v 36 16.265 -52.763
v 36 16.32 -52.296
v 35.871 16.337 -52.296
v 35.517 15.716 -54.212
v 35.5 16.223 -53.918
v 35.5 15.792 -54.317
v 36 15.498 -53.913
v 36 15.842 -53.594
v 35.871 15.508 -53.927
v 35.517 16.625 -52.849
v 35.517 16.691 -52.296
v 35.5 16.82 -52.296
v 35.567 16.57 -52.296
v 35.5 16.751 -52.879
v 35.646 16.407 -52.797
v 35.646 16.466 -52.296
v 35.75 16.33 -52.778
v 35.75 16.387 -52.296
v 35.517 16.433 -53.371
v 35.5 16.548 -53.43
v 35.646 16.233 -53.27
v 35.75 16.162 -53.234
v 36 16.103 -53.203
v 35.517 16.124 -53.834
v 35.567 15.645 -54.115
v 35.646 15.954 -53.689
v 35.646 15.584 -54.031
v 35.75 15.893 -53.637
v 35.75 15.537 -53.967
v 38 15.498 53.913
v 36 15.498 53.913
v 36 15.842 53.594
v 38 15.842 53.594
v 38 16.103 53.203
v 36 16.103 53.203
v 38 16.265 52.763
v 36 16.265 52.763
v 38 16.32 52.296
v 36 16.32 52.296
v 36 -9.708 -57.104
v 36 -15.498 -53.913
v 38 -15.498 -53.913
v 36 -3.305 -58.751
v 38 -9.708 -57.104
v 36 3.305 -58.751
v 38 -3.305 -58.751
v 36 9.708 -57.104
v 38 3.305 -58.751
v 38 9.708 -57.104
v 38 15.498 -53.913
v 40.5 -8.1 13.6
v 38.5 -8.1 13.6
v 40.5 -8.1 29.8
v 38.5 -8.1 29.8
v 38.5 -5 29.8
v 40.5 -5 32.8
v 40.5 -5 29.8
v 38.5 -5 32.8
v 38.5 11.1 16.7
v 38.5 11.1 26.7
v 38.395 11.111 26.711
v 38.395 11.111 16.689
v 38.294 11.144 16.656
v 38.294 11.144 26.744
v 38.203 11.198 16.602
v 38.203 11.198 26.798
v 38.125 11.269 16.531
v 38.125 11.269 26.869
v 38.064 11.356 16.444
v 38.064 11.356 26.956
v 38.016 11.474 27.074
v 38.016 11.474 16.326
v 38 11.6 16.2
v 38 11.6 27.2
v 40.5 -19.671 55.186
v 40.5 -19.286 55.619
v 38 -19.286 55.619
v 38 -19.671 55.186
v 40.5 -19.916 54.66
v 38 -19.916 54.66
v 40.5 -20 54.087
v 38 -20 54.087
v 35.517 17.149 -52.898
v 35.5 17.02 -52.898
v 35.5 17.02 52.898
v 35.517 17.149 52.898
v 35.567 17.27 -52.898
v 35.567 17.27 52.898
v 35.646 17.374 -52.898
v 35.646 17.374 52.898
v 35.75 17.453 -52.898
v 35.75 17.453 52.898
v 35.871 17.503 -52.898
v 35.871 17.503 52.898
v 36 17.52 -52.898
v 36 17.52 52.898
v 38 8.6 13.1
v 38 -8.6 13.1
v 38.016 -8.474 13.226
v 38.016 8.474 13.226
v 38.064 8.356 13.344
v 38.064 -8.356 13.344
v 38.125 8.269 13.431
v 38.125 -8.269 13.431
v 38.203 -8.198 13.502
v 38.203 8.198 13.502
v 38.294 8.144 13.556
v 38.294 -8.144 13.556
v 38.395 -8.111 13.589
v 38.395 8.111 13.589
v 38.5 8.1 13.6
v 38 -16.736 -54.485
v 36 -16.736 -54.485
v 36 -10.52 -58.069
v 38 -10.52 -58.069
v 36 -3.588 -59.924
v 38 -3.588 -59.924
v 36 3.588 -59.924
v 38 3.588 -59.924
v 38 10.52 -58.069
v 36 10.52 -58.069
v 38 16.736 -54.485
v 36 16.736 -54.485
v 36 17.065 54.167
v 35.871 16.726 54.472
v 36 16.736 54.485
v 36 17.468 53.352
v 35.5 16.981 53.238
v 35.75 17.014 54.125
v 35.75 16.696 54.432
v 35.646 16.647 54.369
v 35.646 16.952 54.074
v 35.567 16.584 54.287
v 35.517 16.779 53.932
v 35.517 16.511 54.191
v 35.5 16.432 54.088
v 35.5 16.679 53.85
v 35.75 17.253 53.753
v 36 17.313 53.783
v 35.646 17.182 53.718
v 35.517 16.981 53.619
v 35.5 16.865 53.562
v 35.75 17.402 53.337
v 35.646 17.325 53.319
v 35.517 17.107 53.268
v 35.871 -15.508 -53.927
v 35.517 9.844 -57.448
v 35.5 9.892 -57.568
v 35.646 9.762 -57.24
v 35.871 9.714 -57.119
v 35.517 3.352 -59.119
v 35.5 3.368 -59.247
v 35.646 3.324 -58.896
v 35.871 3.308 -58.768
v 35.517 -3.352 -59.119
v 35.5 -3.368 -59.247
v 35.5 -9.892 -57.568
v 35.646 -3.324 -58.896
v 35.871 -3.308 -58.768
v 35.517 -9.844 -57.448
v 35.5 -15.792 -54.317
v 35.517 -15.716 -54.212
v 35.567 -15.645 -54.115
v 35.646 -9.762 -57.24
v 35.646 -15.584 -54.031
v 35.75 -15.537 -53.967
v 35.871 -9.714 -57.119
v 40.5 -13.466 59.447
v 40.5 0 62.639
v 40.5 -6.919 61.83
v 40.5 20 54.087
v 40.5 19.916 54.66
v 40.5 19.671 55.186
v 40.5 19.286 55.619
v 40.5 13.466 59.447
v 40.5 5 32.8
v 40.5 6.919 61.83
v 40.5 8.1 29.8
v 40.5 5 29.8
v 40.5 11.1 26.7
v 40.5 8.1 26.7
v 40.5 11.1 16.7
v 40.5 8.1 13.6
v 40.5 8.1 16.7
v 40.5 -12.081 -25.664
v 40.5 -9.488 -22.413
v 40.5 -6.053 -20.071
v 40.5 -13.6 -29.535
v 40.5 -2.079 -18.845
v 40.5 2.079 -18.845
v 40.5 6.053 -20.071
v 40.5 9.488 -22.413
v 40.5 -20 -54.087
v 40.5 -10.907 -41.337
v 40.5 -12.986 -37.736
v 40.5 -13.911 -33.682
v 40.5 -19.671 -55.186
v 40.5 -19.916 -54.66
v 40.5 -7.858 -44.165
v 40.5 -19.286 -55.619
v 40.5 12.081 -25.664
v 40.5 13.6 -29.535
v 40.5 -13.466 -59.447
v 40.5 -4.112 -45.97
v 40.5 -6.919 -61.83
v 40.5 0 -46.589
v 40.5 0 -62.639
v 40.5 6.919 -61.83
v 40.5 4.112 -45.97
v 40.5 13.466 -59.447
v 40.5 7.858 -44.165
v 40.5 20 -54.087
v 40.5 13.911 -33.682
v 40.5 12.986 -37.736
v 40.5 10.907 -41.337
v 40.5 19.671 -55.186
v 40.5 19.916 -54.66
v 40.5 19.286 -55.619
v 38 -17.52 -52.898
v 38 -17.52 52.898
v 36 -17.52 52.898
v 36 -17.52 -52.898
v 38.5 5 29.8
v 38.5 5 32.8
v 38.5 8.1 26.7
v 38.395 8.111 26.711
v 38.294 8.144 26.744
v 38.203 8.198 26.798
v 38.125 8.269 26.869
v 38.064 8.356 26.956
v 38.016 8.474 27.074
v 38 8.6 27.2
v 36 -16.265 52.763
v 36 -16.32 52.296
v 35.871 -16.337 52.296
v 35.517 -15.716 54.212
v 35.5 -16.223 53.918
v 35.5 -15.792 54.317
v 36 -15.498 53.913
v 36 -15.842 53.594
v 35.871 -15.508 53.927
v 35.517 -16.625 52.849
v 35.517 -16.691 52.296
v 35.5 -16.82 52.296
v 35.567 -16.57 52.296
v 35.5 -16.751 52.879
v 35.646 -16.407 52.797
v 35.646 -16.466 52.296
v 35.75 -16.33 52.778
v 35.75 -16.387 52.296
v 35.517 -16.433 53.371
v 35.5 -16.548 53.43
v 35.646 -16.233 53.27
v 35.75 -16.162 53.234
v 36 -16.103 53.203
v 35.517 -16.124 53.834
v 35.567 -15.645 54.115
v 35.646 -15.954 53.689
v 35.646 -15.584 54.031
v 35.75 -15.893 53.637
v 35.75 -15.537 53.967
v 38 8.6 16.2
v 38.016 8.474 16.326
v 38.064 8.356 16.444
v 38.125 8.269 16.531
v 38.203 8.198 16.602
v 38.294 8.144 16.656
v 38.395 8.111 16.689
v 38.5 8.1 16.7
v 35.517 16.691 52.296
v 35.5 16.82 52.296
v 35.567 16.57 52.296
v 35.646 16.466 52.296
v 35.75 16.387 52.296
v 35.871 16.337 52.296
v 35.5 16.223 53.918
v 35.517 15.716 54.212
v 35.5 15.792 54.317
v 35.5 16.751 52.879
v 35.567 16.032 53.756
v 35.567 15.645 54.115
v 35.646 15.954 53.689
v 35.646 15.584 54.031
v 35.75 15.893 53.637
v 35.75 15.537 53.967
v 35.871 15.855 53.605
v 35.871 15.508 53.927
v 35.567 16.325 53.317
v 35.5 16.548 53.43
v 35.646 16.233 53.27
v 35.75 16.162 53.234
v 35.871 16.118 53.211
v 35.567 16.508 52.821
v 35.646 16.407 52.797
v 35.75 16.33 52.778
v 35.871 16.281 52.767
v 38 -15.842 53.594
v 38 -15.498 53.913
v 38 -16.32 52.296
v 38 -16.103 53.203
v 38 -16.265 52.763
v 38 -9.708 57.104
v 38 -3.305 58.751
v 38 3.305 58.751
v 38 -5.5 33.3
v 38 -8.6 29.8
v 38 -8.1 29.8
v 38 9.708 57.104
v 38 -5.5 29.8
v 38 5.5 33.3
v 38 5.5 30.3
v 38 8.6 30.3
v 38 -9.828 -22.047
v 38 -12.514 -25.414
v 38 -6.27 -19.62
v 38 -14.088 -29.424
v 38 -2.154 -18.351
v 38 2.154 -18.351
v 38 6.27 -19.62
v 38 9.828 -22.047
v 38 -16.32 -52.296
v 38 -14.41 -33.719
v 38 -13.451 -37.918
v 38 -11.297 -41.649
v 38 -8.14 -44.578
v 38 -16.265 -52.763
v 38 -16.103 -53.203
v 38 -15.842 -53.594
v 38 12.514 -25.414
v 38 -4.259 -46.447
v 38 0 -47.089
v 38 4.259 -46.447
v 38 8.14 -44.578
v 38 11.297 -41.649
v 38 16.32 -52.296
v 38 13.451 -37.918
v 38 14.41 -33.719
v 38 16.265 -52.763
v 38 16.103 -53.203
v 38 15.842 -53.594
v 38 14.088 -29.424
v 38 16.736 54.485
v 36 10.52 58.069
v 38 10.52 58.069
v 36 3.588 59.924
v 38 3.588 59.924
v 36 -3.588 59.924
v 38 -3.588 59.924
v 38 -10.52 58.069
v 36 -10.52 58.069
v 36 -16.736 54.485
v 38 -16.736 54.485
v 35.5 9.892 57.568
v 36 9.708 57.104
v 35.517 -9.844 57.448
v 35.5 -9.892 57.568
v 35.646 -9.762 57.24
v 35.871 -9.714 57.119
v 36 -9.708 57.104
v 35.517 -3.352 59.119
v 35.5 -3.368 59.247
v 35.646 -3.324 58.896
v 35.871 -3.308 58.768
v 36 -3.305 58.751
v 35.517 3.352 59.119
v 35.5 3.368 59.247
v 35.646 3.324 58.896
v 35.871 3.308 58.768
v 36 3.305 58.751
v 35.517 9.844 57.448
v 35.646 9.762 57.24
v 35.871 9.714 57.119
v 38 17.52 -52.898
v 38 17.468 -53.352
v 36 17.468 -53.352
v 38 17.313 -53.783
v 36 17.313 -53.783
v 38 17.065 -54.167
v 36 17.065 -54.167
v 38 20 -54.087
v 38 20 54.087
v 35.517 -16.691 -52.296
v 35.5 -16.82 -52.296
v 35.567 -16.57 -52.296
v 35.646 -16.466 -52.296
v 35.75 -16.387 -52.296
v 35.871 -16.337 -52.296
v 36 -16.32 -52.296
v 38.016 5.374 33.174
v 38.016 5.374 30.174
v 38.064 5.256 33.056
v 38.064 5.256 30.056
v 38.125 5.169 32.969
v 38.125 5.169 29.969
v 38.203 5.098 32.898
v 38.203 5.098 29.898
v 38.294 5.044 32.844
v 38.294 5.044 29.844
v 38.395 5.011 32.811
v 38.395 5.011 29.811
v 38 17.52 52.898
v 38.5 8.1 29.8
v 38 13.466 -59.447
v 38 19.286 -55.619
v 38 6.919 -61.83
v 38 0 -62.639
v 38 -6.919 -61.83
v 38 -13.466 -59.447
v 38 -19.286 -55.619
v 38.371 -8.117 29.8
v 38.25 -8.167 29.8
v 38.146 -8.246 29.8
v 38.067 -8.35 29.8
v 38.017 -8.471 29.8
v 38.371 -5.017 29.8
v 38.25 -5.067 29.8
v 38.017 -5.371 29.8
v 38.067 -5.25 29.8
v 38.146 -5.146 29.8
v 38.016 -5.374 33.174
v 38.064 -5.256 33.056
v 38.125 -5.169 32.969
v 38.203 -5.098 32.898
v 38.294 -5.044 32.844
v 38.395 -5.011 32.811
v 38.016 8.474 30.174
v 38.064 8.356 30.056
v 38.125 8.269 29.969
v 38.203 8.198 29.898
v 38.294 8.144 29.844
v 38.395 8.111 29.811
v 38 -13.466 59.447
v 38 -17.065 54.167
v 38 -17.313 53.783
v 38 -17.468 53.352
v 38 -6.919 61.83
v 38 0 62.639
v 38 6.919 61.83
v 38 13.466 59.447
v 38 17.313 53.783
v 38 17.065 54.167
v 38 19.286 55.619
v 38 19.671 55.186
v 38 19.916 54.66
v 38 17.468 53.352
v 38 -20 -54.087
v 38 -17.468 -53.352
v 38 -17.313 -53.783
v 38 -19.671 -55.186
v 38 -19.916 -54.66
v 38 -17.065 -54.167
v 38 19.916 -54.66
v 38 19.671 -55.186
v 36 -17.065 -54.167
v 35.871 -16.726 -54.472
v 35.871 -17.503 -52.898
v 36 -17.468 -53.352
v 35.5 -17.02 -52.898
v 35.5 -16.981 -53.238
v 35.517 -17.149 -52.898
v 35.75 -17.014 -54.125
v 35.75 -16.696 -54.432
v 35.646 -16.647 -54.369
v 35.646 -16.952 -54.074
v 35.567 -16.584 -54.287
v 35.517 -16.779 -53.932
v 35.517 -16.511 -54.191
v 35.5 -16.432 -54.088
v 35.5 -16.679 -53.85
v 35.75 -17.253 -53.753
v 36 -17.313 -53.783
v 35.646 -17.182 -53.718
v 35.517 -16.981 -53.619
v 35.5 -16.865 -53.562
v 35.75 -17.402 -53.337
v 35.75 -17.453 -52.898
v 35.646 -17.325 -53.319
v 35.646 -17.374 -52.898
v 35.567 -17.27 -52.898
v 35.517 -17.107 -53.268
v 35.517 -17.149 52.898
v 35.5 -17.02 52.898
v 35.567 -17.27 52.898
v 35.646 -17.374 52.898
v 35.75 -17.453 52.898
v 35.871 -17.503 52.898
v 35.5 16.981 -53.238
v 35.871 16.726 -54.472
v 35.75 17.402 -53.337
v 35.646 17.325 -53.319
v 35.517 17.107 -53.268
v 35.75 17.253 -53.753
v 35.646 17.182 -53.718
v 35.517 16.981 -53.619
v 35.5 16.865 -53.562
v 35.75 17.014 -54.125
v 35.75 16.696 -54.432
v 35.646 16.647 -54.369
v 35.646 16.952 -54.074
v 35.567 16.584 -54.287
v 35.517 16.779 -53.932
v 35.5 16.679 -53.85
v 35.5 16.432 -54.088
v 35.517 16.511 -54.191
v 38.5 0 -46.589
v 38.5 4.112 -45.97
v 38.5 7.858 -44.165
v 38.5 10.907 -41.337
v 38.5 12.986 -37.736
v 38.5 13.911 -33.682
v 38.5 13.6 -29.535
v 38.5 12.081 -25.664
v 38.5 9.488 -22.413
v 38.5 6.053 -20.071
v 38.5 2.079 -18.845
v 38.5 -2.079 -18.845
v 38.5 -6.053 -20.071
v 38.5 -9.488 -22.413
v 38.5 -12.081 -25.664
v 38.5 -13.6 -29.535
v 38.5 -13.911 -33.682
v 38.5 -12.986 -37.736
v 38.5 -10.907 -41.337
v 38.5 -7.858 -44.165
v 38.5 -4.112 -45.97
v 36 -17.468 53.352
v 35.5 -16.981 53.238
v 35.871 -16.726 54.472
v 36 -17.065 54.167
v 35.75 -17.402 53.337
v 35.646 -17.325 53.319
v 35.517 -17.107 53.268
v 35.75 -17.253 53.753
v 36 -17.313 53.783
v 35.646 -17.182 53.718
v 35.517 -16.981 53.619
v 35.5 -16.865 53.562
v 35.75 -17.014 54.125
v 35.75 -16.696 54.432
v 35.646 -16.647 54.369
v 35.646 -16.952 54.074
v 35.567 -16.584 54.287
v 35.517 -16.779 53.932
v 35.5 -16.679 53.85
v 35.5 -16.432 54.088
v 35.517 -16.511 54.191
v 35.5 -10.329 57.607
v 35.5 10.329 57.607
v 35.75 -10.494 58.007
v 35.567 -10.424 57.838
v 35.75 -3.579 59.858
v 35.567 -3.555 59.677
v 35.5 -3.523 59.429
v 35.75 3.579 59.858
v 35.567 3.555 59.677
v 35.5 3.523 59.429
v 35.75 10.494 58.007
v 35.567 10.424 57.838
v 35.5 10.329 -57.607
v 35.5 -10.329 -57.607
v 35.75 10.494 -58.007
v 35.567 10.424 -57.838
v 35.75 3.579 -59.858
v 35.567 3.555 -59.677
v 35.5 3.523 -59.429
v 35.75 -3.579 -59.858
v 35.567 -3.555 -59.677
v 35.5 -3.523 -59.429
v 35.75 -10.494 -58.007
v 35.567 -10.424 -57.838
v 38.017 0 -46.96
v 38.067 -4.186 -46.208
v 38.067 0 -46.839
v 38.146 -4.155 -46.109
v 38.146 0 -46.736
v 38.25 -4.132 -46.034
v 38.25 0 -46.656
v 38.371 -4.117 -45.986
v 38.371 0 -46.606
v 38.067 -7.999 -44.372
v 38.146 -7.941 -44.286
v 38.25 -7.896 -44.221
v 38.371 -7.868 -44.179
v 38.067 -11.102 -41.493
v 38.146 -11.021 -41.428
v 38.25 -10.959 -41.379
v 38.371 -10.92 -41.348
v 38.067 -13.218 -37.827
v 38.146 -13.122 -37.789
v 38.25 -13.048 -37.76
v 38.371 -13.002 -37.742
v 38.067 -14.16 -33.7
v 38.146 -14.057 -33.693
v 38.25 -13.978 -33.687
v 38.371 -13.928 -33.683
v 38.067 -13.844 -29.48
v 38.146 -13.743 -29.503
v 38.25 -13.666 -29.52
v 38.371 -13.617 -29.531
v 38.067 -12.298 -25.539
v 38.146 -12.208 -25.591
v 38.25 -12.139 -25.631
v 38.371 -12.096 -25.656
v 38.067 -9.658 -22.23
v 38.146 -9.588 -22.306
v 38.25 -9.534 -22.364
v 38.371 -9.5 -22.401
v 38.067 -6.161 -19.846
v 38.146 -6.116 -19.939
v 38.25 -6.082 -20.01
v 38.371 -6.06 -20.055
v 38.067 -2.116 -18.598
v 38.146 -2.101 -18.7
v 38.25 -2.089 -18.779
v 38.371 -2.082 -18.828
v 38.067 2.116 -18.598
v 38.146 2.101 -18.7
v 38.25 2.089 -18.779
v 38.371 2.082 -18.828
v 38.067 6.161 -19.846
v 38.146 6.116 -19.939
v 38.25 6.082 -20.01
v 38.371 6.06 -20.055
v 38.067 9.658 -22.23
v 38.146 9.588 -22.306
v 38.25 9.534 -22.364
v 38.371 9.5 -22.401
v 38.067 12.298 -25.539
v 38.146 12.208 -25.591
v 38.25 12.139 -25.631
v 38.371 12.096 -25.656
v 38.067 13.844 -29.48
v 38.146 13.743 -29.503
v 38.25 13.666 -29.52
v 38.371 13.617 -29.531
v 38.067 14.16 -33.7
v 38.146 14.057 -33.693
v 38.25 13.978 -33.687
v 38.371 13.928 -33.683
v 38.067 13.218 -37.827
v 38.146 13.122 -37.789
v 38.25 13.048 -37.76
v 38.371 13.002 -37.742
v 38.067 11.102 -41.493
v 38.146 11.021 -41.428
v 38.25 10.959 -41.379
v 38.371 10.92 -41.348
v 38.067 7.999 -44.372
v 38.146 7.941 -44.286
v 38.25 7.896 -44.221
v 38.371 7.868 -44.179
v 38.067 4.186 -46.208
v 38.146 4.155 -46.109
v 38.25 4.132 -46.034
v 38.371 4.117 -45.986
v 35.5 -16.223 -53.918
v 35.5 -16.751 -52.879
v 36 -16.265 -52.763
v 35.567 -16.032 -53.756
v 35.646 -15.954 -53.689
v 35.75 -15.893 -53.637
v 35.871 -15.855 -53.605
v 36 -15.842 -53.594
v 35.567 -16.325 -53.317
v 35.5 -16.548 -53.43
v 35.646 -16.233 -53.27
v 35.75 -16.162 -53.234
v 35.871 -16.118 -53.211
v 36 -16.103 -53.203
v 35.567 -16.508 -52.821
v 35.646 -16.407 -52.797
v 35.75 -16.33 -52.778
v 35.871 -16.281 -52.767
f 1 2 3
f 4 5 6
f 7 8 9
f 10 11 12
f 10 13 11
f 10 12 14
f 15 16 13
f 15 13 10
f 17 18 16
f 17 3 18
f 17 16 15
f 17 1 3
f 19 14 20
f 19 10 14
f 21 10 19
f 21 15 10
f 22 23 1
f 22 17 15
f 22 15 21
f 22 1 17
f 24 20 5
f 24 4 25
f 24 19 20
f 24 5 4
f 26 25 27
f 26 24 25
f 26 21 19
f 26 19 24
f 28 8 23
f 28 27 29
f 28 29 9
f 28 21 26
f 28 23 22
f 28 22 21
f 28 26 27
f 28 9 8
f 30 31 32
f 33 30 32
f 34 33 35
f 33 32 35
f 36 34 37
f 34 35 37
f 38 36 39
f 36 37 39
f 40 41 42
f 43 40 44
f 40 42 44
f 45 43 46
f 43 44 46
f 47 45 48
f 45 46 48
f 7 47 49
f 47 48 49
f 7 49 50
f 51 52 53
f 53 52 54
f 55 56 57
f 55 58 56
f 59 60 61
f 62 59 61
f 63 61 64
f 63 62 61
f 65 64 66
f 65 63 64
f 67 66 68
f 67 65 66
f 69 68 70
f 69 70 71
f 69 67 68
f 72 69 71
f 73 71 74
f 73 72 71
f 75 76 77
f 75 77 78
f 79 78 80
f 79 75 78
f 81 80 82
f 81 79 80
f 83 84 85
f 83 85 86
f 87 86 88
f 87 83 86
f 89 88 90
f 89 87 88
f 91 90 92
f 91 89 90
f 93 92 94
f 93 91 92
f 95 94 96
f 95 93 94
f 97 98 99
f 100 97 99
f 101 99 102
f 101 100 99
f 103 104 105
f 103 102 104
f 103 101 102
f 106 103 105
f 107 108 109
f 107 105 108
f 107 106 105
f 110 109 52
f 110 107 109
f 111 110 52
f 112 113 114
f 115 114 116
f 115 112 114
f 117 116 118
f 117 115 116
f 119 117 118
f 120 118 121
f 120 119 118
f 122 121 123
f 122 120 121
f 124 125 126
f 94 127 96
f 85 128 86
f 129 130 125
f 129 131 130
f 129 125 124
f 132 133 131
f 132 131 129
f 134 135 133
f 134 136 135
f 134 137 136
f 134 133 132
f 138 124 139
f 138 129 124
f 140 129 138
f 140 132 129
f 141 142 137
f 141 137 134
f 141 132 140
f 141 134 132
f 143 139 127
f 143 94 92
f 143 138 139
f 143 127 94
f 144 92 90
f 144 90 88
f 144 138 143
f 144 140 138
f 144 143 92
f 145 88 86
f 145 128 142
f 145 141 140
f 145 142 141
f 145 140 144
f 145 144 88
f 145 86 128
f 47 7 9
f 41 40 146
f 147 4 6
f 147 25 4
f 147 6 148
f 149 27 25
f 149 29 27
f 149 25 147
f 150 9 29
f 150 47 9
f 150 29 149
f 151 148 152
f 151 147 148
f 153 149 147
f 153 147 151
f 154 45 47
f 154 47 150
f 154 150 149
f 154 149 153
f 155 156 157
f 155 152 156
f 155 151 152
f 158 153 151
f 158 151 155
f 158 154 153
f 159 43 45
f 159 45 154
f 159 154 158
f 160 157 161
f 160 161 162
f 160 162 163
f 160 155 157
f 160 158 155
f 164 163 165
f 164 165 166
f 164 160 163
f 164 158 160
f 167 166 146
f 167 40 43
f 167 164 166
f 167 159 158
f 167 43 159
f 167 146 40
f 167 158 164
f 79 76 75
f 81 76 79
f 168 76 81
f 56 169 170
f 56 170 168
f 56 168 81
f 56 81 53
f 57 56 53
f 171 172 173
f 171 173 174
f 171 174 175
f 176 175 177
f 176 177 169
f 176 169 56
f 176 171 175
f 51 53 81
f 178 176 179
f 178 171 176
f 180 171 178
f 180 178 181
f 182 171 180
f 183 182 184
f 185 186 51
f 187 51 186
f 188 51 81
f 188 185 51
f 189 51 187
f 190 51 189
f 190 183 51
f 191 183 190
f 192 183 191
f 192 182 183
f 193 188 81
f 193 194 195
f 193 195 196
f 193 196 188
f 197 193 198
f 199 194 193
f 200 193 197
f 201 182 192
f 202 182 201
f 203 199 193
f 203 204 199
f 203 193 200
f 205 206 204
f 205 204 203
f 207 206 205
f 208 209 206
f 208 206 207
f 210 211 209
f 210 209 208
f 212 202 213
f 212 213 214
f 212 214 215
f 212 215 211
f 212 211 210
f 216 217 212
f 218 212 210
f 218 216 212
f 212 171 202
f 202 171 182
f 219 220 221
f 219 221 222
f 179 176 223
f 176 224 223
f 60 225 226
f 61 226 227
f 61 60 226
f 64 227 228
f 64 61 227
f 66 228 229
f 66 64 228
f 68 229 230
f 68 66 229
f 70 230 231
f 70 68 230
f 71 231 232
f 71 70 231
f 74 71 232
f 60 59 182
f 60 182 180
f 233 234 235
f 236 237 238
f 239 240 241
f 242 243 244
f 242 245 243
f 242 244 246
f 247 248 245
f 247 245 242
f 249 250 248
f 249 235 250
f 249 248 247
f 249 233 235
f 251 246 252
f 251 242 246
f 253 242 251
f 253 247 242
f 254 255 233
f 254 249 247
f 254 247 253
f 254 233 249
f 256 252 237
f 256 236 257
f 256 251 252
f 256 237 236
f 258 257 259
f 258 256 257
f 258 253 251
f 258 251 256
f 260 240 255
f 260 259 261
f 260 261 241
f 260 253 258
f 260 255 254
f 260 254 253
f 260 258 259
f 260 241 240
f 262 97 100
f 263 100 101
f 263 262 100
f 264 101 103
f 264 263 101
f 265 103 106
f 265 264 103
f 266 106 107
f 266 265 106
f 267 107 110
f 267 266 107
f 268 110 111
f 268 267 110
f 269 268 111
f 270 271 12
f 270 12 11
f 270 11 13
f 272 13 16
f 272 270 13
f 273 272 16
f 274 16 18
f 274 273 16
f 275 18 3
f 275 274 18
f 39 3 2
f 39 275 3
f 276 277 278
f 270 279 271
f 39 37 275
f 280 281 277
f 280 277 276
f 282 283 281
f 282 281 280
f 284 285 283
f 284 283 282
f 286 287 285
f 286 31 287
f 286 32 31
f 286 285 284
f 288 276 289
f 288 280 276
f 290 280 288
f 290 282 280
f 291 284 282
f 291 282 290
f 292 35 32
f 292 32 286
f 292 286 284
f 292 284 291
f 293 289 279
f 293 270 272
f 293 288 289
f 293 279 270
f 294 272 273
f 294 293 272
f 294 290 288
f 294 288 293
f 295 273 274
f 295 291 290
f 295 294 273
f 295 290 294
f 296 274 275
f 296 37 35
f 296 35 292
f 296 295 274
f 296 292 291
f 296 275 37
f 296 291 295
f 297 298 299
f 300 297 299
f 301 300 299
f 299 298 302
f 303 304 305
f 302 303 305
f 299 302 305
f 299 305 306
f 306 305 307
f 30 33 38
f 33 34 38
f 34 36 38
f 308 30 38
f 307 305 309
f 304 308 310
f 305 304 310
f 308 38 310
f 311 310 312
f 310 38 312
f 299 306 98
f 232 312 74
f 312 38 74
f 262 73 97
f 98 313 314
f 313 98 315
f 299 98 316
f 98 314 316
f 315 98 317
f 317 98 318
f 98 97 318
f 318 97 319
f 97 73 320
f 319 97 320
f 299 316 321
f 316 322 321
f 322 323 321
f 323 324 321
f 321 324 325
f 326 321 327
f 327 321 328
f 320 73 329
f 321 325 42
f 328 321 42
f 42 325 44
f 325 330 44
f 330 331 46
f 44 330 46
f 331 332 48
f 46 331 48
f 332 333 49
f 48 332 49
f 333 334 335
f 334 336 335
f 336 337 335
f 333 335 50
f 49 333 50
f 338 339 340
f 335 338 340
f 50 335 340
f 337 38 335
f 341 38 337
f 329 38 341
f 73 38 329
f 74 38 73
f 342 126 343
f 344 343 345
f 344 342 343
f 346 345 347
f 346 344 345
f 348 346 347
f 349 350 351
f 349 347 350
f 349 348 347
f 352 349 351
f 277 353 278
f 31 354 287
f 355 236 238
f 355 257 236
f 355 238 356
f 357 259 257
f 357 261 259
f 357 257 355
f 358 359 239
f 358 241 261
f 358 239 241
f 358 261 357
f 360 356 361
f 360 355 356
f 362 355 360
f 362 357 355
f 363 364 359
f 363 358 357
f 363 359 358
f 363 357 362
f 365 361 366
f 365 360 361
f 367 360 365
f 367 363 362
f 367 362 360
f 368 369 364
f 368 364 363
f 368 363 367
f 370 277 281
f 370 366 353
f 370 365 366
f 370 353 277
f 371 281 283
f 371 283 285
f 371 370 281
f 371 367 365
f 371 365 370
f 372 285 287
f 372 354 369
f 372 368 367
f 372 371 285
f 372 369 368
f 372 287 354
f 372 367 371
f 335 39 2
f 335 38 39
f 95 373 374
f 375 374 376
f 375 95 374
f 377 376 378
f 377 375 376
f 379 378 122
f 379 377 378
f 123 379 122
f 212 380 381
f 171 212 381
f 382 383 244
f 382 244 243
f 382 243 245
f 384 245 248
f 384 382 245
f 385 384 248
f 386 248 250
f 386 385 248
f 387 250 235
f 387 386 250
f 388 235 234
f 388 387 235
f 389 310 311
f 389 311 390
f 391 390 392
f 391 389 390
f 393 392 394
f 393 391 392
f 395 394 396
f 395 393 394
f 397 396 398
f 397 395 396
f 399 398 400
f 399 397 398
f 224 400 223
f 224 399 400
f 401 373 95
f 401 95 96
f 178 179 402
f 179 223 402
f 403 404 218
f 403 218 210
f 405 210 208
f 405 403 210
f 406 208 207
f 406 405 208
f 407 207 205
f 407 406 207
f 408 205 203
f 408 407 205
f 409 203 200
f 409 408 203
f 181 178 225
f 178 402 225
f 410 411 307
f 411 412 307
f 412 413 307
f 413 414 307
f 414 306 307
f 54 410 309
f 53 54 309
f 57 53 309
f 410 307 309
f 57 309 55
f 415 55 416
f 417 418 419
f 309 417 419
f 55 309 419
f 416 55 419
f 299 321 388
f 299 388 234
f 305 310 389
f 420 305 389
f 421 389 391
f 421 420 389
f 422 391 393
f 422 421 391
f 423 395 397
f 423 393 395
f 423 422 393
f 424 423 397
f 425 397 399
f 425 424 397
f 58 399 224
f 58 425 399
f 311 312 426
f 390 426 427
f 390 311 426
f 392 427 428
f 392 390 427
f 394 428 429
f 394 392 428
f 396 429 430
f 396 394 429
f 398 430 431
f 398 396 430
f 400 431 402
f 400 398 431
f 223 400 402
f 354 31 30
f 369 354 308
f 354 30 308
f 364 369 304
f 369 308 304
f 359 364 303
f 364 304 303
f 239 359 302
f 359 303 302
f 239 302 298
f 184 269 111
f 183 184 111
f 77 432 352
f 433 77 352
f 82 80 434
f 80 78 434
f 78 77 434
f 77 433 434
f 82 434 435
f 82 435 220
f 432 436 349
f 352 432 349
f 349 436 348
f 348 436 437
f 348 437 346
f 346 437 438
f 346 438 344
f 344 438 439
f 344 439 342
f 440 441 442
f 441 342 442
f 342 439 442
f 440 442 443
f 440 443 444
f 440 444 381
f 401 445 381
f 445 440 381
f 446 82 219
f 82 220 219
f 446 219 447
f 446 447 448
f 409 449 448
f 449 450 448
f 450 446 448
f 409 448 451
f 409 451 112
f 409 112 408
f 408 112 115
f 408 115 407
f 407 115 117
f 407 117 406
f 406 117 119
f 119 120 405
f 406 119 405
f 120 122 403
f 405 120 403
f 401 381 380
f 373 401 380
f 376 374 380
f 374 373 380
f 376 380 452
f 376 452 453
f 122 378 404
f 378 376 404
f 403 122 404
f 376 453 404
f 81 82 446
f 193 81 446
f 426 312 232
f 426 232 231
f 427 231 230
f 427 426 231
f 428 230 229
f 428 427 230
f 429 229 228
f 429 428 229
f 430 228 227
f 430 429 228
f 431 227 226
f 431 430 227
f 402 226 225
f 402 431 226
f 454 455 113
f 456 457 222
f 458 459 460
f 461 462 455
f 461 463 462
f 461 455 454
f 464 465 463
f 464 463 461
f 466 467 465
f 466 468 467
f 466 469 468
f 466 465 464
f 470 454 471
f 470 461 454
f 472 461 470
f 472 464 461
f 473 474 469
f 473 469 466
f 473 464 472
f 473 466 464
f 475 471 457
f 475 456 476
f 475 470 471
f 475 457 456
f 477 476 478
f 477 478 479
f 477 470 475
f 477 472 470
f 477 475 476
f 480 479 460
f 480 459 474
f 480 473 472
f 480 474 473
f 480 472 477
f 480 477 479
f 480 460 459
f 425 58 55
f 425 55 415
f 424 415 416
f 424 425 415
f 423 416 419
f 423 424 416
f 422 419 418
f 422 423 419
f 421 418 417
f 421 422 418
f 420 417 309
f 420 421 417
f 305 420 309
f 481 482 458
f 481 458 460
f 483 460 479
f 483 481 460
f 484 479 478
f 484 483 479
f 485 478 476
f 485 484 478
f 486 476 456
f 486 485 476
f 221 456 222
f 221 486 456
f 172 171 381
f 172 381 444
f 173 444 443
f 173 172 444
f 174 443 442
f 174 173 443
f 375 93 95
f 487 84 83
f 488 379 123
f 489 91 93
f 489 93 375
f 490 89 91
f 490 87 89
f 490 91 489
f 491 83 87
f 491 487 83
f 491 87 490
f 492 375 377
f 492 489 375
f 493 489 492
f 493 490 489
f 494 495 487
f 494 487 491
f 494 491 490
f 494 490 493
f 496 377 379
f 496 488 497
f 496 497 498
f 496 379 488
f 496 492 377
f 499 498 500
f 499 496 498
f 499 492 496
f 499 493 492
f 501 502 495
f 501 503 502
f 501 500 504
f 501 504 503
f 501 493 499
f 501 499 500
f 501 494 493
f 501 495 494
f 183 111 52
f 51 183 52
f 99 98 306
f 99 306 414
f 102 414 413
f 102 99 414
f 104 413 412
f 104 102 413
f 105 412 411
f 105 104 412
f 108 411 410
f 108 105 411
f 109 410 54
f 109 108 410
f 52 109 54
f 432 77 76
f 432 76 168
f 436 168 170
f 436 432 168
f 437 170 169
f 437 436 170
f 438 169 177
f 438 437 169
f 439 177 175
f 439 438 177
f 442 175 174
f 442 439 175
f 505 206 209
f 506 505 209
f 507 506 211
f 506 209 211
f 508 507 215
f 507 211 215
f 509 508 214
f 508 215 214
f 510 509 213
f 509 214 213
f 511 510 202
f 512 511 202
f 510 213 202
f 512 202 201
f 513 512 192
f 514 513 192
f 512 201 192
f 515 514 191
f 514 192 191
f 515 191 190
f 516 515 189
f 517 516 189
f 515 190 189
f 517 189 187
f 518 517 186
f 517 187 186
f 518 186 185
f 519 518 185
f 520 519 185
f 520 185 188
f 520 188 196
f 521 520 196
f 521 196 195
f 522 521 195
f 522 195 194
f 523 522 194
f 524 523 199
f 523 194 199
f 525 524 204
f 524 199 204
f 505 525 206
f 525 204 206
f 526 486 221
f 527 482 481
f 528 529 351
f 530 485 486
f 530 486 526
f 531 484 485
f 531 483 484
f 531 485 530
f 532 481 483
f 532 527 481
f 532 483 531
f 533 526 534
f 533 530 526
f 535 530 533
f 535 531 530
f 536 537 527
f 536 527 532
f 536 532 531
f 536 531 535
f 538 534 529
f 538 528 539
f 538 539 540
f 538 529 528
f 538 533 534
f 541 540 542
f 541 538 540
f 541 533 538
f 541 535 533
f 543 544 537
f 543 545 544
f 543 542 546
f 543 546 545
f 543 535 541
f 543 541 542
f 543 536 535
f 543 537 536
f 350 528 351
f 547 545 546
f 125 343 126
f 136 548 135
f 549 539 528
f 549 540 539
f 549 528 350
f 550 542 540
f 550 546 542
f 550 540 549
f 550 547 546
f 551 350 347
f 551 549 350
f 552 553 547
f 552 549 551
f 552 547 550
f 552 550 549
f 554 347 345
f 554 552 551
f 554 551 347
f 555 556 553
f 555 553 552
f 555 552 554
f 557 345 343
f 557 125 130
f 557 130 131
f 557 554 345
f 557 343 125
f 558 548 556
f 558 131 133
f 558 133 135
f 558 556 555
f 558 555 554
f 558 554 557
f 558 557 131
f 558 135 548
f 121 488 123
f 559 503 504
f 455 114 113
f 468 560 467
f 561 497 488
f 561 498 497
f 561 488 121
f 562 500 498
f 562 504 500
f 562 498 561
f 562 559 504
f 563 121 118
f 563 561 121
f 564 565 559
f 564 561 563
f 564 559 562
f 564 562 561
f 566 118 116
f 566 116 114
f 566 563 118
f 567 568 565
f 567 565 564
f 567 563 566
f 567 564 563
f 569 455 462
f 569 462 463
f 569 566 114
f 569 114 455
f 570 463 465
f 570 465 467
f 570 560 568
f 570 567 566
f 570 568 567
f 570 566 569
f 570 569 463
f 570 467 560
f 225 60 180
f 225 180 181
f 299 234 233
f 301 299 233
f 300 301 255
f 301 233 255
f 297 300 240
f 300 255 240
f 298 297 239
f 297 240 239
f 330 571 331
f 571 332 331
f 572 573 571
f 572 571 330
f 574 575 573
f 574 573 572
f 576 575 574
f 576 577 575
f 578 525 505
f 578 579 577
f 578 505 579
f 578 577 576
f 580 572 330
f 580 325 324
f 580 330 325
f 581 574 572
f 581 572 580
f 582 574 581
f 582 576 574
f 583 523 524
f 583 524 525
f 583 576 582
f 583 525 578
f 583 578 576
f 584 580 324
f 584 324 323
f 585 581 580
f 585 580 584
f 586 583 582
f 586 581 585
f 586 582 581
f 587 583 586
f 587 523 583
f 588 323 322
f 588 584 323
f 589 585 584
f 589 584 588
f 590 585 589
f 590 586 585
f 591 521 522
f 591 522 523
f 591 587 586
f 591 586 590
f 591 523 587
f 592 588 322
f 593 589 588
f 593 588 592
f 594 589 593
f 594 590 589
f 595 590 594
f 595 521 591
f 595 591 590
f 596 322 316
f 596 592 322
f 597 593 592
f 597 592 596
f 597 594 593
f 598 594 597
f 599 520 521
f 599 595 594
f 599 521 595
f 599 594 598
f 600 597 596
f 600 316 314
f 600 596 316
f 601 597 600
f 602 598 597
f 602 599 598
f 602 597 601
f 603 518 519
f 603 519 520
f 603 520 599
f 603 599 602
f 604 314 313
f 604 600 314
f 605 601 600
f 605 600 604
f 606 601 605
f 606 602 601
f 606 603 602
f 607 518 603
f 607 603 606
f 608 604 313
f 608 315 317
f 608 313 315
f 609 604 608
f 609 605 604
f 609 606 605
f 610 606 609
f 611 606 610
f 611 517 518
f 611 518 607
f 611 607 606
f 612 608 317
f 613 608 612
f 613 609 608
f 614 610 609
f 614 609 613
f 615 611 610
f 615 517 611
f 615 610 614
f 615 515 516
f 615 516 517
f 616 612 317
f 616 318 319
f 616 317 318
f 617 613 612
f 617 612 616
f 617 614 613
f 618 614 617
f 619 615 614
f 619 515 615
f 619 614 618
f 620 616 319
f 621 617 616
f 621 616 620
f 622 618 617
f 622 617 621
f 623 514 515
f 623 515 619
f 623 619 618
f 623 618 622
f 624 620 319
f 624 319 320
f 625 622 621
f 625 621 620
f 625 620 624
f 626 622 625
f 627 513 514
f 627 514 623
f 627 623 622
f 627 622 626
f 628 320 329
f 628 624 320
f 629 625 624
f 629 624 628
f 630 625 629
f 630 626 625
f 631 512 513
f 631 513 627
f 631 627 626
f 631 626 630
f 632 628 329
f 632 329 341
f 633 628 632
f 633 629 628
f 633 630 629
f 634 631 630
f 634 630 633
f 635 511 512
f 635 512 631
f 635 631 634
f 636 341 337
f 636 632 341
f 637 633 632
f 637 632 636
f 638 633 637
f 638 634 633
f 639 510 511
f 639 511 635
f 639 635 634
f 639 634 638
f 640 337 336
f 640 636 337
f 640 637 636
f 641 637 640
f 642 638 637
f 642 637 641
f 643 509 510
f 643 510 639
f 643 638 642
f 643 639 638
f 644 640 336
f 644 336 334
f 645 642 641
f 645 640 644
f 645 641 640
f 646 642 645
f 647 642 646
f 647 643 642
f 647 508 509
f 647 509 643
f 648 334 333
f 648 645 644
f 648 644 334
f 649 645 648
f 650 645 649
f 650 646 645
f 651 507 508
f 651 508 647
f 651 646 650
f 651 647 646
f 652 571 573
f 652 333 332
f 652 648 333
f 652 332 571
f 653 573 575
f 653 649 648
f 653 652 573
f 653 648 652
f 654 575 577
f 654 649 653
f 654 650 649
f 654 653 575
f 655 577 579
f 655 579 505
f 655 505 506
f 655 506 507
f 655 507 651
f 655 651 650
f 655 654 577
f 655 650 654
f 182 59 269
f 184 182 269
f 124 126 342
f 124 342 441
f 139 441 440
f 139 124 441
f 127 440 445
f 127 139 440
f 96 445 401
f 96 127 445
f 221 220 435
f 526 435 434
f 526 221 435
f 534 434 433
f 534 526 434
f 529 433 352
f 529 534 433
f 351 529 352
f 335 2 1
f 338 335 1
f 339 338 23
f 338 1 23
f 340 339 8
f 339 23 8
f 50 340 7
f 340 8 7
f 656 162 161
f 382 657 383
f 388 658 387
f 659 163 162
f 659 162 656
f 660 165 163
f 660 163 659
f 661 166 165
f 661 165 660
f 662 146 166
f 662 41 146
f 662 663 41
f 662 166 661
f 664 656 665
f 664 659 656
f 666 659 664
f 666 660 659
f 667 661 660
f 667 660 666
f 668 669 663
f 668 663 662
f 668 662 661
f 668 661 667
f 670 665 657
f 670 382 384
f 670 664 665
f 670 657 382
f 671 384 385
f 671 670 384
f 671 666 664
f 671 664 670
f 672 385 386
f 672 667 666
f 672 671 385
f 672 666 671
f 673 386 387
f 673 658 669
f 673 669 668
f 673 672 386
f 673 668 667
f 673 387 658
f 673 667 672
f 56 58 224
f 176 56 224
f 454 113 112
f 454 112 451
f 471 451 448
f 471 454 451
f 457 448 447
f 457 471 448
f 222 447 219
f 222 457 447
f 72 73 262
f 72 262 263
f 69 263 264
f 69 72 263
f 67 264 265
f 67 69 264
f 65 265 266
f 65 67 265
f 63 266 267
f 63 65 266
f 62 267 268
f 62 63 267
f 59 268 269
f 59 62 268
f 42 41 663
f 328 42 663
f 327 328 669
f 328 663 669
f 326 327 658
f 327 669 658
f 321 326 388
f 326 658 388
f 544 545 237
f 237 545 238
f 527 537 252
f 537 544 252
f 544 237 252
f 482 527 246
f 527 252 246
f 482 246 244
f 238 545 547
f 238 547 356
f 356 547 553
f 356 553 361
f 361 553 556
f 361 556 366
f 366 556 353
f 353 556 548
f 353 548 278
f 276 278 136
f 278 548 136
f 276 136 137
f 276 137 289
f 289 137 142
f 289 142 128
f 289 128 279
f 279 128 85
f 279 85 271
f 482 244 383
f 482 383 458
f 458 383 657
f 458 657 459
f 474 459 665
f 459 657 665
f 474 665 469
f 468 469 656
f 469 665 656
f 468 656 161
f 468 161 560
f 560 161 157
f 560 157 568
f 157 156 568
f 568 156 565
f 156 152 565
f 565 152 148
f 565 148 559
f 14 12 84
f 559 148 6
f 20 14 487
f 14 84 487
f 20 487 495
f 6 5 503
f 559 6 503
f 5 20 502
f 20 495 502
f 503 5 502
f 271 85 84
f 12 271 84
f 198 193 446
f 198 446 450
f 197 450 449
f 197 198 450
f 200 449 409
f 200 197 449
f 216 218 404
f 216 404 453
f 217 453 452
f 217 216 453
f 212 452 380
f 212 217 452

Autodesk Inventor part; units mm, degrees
ref_plane "YZ Plane" through (0, 0, 0) normal (1, 0, 0) x (0, 1, 0)
ref_plane "XZ Plane" through (0, 0, 0) normal (0, 1, 0) x (-1, 0, 0)
ref_plane "XY Plane" through (0, 0, 0) normal (0, 0, 1) x (1, 0, 0)
sketch "Sketch1" plane through (0, 0, 0) normal (1, 0, 0) x (0, 1, 0)
  line L0 (-20, 55) -> (-20, -55)
  line L1 (-20, -55) -> (20, -55)
  line L2 (20, -55) -> (20, 55)
  line L3 (20, 55) -> (-20, 55)
  line L4 (-20, 55) -> (20, -55) construction
  line L5 (-20, -55) -> (20, 55) construction
  point P0 (0, 0)
  dimension "d0" = 110
  dimension "d1" = 40
extrude "Extrusion1" add sketch "Sketch1" along normal blind 2
sketch "Sketch2" plane through (2, 0, 0) normal (1, 0, 0) x (0, 0, -1)
  line L0 (55, 20) -> (-55, 20) projected
  line L1 (0, 20) -> (0, -25.4851) construction
  line L2 (-55, 20) -> (-55, -20) projected
  line L3 (-55, 0) -> (-48, 0)
  line L4 (-48, 0) -> (-48, 15)
  line L5 (-48, 15) -> (22, 15)
  line L6 (22, 15) -> (22, -15)
  line L7 (22, -15) -> (-48, -15)
  line L8 (-48, -15) -> (-48, 0)
  line L9 (-50.5, 12.5) -> (-45.5, 12.5)
  line L10 (-45.5, 12.5) -> (-45.5, 17.5)
  line L11 (-45.5, 17.5) -> (-50.5, 17.5)
  line L12 (-50.5, 17.5) -> (-50.5, 12.5)
  line L13 (-50.5, 12.5) -> (-45.5, 17.5) construction
  line L14 (-45.5, 12.5) -> (-50.5, 17.5) construction
  line L15 (-13, 15) -> (-13, -15)
  line L16 (24.5, 12.5) -> (19.5, 12.5)
  line L17 (19.5, 12.5) -> (19.5, 17.5)
  line L18 (19.5, 17.5) -> (24.5, 17.5)
  line L19 (24.5, 17.5) -> (24.5, 12.5)
  line L20 (24.5, 12.5) -> (19.5, 17.5) construction
  line L21 (19.5, 12.5) -> (24.5, 17.5) construction
  line L22 (-48, 0) -> (22, 0) construction
  line L23 (-50.5, -17.5) -> (-45.5, -17.5)
  line L24 (-45.5, -17.5) -> (-45.5, -12.5)
  line L25 (-45.5, -12.5) -> (-50.5, -12.5)
  line L26 (-50.5, -12.5) -> (-50.5, -17.5)
  line L27 (-50.5, -17.5) -> (-45.5, -12.5) construction
  line L28 (-45.5, -17.5) -> (-50.5, -12.5) construction
  line L29 (24.5, -17.5) -> (19.5, -17.5)
  line L30 (19.5, -17.5) -> (19.5, -12.5)
  line L31 (19.5, -12.5) -> (24.5, -12.5)
  line L32 (24.5, -12.5) -> (24.5, -17.5)
  line L33 (24.5, -17.5) -> (19.5, -12.5) construction
  line L34 (19.5, -17.5) -> (24.5, -12.5) construction
  point P0 (0, 0)
  dimension "d4" = 7
  dimension "d5" = 15
  dimension "d6" = 70
  dimension "d7" = 30
  dimension "d8" = 5
  dimension "d9" = 5
  dimension "d10" = 5
  dimension "d11" = 5
  dimension "d12" = 5
  dimension "d13" = 5
extrude "Extrusion2" add sketch "Sketch2" along normal blind 20
sketch "Sketch3" plane through (22, 0, 0) normal (1, 0, 0) x (0, 0, -1)
  line L0 (22, -12.5) -> (22, 12.5) projected
  line L1 (22, 12.5) -> (24.5, 12.5) projected
  line L2 (24.5, 12.5) -> (24.5, 17.5) projected
  line L3 (24.5, 17.5) -> (19.5, 17.5) projected
  line L4 (19.5, 17.5) -> (19.5, 15) projected
  line L5 (19.5, 15) -> (-45.5, 15) projected
  line L6 (-45.5, 15) -> (-45.5, 17.5) projected
  line L7 (-45.5, 17.5) -> (-50.5, 17.5) projected
  line L8 (-50.5, 17.5) -> (-50.5, 12.5) projected
  line L9 (-50.5, 12.5) -> (-48, 12.5) projected
  line L10 (-48, 12.5) -> (-48, -12.5) projected
  line L11 (-48, -12.5) -> (-50.5, -12.5) projected
  line L12 (-50.5, -12.5) -> (-50.5, -17.5) projected
  line L13 (-50.5, -17.5) -> (-45.5, -17.5) projected
  line L14 (-45.5, -17.5) -> (-45.5, -15) projected
  line L15 (-45.5, -15) -> (19.5, -15) projected
  line L16 (19.5, -15) -> (19.5, -17.5) projected
  line L17 (19.5, -17.5) -> (24.5, -17.5) projected
  line L18 (24.5, -17.5) -> (24.5, -12.5) projected
  line L19 (24.5, -12.5) -> (22, -12.5) projected
  line L20 (-13, 15) -> (-13, -15)
  line L21 (22, -15) -> (22, 15)
  line L22 (-48, 15) -> (-48, -15)
  line L23 (-48, -15) -> (22, 15) construction
  line L24 (22, -15) -> (-48, 15) construction
  line L25 (-38.7087, -2.3779) -> (12.7087, -2.3779)
  line L26 (12.7087, -2.3779) -> (12.7087, 2.3779)
  line L27 (12.7087, 2.3779) -> (-38.7087, 2.3779)
  line L28 (-38.7087, 2.3779) -> (-38.7087, -2.3779)
  line L29 (-38.7087, -2.3779) -> (12.7087, 2.3779) construction
  line L30 (12.7087, -2.3779) -> (-38.7087, 2.3779) construction
  line L31 (-10.5799, -13.0883) -> (-10.5799, 13.0883)
  line L32 (-10.5799, 13.0883) -> (-15.4201, 13.0883)
  line L33 (-15.4201, 13.0883) -> (-15.4201, -13.0883)
  line L34 (-15.4201, -13.0883) -> (-10.5799, -13.0883)
  line L35 (-10.5799, -13.0883) -> (-15.4201, 13.0883) construction
  line L36 (-10.5799, 13.0883) -> (-15.4201, -13.0883) construction
  line L37 (-45.5, 15) -> (-48, 15)
  line L38 (24.5, 17.5) -> (19.5, 17.5)
  line L39 (19.5, 17.5) -> (19.5, 15)
  line L40 (19.5, 15) -> (24.5, 15)
  line L41 (24.5, 15) -> (24.5, 17.5)
  line L42 (24.5, 12.5) -> (22, 12.5)
  line L43 (22, 12.5) -> (22, 17.5)
  line L44 (22, 17.5) -> (24.5, 17.5)
  line L45 (24.5, 17.5) -> (24.5, 12.5)
  line L46 (-48, 12.5) -> (-50.5, 12.5) projected
  line L47 (-50.5, 17.5) -> (-48, 17.5)
  line L48 (-48, 17.5) -> (-48, 12.5)
  line L49 (-48, 12.5) -> (-50.5, 12.5)
  line L50 (-50.5, 12.5) -> (-50.5, 17.5)
  line L51 (-50.5, 12.5) -> (-50.5, 17.5) projected
  line L52 (-50.5, 17.5) -> (-45.5, 17.5)
  line L53 (-45.5, 17.5) -> (-45.5, 15)
  line L54 (-45.5, 15) -> (-50.5, 15)
  line L55 (-50.5, 15) -> (-50.5, 17.5)
  line L56 (-50.5, -17.5) -> (-45.5, -17.5)
  line L57 (-45.5, -17.5) -> (-45.5, -15.0713)
  line L58 (-45.5, -15.0713) -> (-50.5, -15.0713)
  line L59 (-50.5, -15.0713) -> (-50.5, -17.5)
  line L60 (-45.5, -17.5) -> (-50.5, -17.5) projected
  line L61 (-50.5, -17.5) -> (-48, -17.5)
  line L62 (-48, -17.5) -> (-48, -12.5)
  line L63 (-48, -12.5) -> (-50.5, -12.5)
  line L64 (-50.5, -12.5) -> (-50.5, -17.5)
  line L65 (19.5, -17.5) -> (24.5, -17.5)
  line L66 (24.5, -17.5) -> (24.5, -15)
  line L67 (24.5, -15) -> (19.5, -15)
  line L68 (19.5, -15) -> (19.5, -17.5)
  line L69 (24.5, -12.5) -> (24.5, -17.5) projected
  line L70 (24.5, -17.5) -> (22, -17.5)
  line L71 (22, -17.5) -> (22, -12.5)
  line L72 (22, -12.5) -> (24.5, -12.5)
  line L73 (24.5, -12.5) -> (24.5, -17.5)
  point P0 (0, 0)
  point P1 (-13, 0)
extrude "Extrusion3" add sketch "Sketch3" along normal blind 9 contours L19 L18 L67 L21 | L21 L40 L2 L1 | L71 L17 L16 L67 | L67 L18 L17 L71 | L43 L3 L2 L40 | L40 L4 L3 L43 | L34 L33 L25 L20 | L20 L25 L31 L34 | L37 L48 L7 L6 | L32 L31 L27 L20 | L20 L27 L33 L32 | L14 L13 L62 L58 | L25 L33 L27 L20 | L20 L27 L31 L25 | L54 L8 L7 L48 | L22 L9 L8 L54 | L62 L13 L12 L58 | L58 L12 L11 L22 L62 | L25 L28 L27 L33 | L31 L27 L26 L25
sketch "Sketch4" plane through (31, 0, 0) normal (1, 0, 0) x (0, 0, -1)
  line L0 (-48, 15) -> (-45.5, 15) projected
  line L1 (-45.5, 15) -> (-45.5, 17.5) projected
  line L2 (-45.5, 17.5) -> (-50.5, 17.5) projected
  line L3 (-50.5, 17.5) -> (-50.5, 12.5) projected
  line L4 (-50.5, 12.5) -> (-48, 12.5) projected
  line L5 (-48, 12.5) -> (-48, 15) projected
  line L6 (-48, -15.0713) -> (-48, -12.5) projected
  line L7 (-48, -12.5) -> (-50.5, -12.5) projected
  line L8 (-50.5, -12.5) -> (-50.5, -17.5) projected
  line L9 (-50.5, -17.5) -> (-45.5, -17.5) projected
  line L10 (-45.5, -17.5) -> (-45.5, -15.0713) projected
  line L11 (-45.5, -15.0713) -> (-48, -15.0713) projected
  line L12 (22, -15) -> (19.5, -15) projected
  line L13 (19.5, -15) -> (19.5, -17.5) projected
  line L14 (19.5, -17.5) -> (24.5, -17.5) projected
  line L15 (24.5, -17.5) -> (24.5, -12.5) projected
  line L16 (24.5, -12.5) -> (22, -12.5) projected
  line L17 (22, -12.5) -> (22, -15) projected
  line L18 (22, 15) -> (22, 12.5) projected
  line L19 (22, 12.5) -> (24.5, 12.5) projected
  line L20 (24.5, 12.5) -> (24.5, 17.5) projected
  line L21 (24.5, 17.5) -> (19.5, 17.5) projected
  line L22 (19.5, 17.5) -> (19.5, 15) projected
  line L23 (19.5, 15) -> (22, 15) projected
  point P0 (0, 0)
extrude "Extrusion4" add sketch "Sketch4" along normal blind 3
sketch "Sketch5" plane through (22, 0, 0) normal (1, 0, 0) x (0, 0, -1)
  line L0 (-48, 15) -> (-48, 12.5) projected
  line L1 (-48, 12.5) -> (-48, -12.5) projected
  line L2 (-48, -12.5) -> (-48, -15.0713) projected
  line L3 (-48, -15.0713) -> (-45.5, -15.0713) projected
  line L4 (-45.5, -15.0713) -> (-45.5, -15) projected
  line L5 (-45.5, -15) -> (19.5, -15) projected
  line L6 (19.5, -15) -> (22, -15) projected
  line L7 (22, -15) -> (22, -12.5) projected
  line L8 (22, -12.5) -> (22, 12.5) projected
  line L9 (22, 12.5) -> (22, 15) projected
  line L10 (22, 15) -> (19.5, 15) projected
  line L11 (19.5, 15) -> (-45.5, 15) projected
  line L12 (-45.5, 15) -> (-48, 15) projected
  line L13 (12.7087, -2.3779) -> (-10.5799, -2.3779) projected
  line L14 (-10.5799, -2.3779) -> (-10.5799, -13.0883) projected
  line L15 (-10.5799, -13.0883) -> (-15.4201, -13.0883) projected
  line L16 (-15.4201, -13.0883) -> (-15.4201, -2.3779) projected
  line L17 (-15.4201, -2.3779) -> (-38.7087, -2.3779) projected
  line L18 (-38.7087, -2.3779) -> (-38.7087, 2.3779) projected
  line L19 (-38.7087, 2.3779) -> (-15.4201, 2.3779) projected
  line L20 (-15.4201, 2.3779) -> (-15.4201, 13.0883) projected
  line L21 (-15.4201, 13.0883) -> (-10.5799, 13.0883) projected
  line L22 (-10.5799, 13.0883) -> (-10.5799, 2.3779) projected
  line L23 (-10.5799, 2.3779) -> (12.7087, 2.3779) projected
  line L24 (12.7087, 2.3779) -> (12.7087, -2.3779) projected
  line L25 (-45.5, 15.1) -> (19.5, 15.1)
  line L26 (19.5, 15.1) -> (22.1, 15.1)
  line L27 (22.1, 15.1) -> (22.1, 12.5)
  line L28 (22.1, 12.5) -> (22.1, -12.5)
  line L29 (22.1, -12.5) -> (22.1, -15.1)
  line L30 (22.1, -15.1) -> (19.5, -15.1)
  line L31 (19.5, -15.1) -> (-45.4, -15.1)
  line L32 (-45.4, -15.1) -> (-45.4, -15.1713)
  line L33 (-45.4, -15.1713) -> (-48.1, -15.1713)
  line L34 (-48.1, -15.1713) -> (-48.1, -12.5)
  line L35 (-48.1, -12.5) -> (-48.1, 12.5)
  line L36 (-48.1, 12.5) -> (-48.1, 15.1)
  line L37 (-48.1, 15.1) -> (-45.5, 15.1)
  point P0 (0, 0)
  dimension "d20" = 0.1
extrude "Extrusion5" cut sketch "Sketch5" along normal blind 50 contours L25 L26 L27 L28 L29 L30 L31 L32 L33 L34 L35 L36 L37
sketch "Sketch7" plane through (31, 0, 0) normal (1, 0, 0) x (0, 0, -1)
  line L0 (12.7087, 2.3779) -> (-10.5799, 2.3779) projected
  line L1 (-10.5799, -2.3779) -> (12.7087, -2.3779) projected
  line L2 (-3.8945, 2.3779) -> (12.8589, 2.3779)
  line L3 (12.8589, 2.3779) -> (12.8589, -2.3779)
  line L4 (12.8589, -2.3779) -> (-3.8945, -2.3779)
  line L5 (-3.8945, -2.3779) -> (-3.8945, 2.3779)
  point P0 (0, 0)
extrude "Extrusion7" cut sketch "Sketch7" against normal blind 9
chamfer "Chamfer1" distance 9 angle 45 1 edges at (22, 0, -22)
sketch "Sketch9" plane through (2, 0, 0) normal (1, 0, 0) x (0, 0, -1)
  arc A0 (-55, 20) -> (-55, -20) centre (-32.6393, 0) ccw
  line L0 (-55, -20) -> (55, -20) projected
  line L1 (55, 20) -> (-55, 20) projected
  arc A1 (55, -20) -> (55, 20) centre (32.6393, 0) ccw
  arc A2 (-53.8996, 17.6) -> (-53.8996, -17.6) centre (-32.6393, 0) ccw
  line L2 (-53.8996, 17.6) -> (53.8996, 17.6)
  arc A3 (53.8996, -17.6) -> (53.8996, 17.6) centre (32.6393, 0) ccw
  line L3 (53.8996, -17.6) -> (-53.8996, -17.6)
  point P0 (0, 0)
  dimension "d34" = 30
  dimension "d35" = 30
  dimension "d36" = 2.4
extrude "Extrusion8" add sketch "Sketch9" along normal blind 36
sketch "Sketch10" plane through (0, 0, 0) normal (-1, 0, 0) x (0, 0, 1)
  line L0 (55, -20) -> (-55, -20) projected
  line L1 (-55, 20) -> (55, 20) projected
  arc A0 (55, -20) -> (55, 20) centre (32.6393, 0) ccw projected
  arc A1 (-55, 20) -> (-55, -20) centre (-32.6393, 0) ccw projected
  point P0 (0, 0)
extrude "Extrusion9" add sketch "Sketch10" against normal blind 2
sketch "Sketch11" plane through (38, 0, 0) normal (1, 0, 0) x (0, 0, -1)
  line L0 (-53.8996, 17.6) -> (53.8996, 17.6) projected
  arc A0 (53.8996, -17.6) -> (53.8996, 17.6) centre (32.6393, 0) ccw projected
  line L1 (53.8996, -17.6) -> (-53.8996, -17.6) projected
  arc A1 (-53.8996, 17.6) -> (-53.8996, -17.6) centre (-32.6393, 0) ccw projected
  arc A2 (-55, 20) -> (-55, -20) centre (-32.6393, 0) ccw projected
  line L2 (-55, -20) -> (55, -20) projected
  arc A3 (55, -20) -> (55, 20) centre (32.6393, 0) ccw projected
  line L3 (55, 20) -> (-55, 20) projected
  line L4 (53.8619, 17.52) -> (-53.8619, 17.52)
  arc A4 (-53.8619, 17.52) -> (-53.8619, -17.52) centre (-32.6393, 0) ccw
  line L5 (-53.8619, -17.52) -> (53.8619, -17.52)
  arc A5 (53.8619, -17.52) -> (53.8619, 17.52) centre (32.6393, 0) ccw
  line L6 (-53.2888, 16.32) -> (53.2888, 16.32)
  arc A6 (53.2888, -16.32) -> (53.2888, 16.32) centre (32.6393, 0) ccw
  line L7 (53.2888, -16.32) -> (-53.2888, -16.32)
  arc A7 (-53.2888, 16.32) -> (-53.2888, -16.32) centre (-32.6393, 0) ccw
  point P0 (0, 0)
  dimension "d41" = 0.08
  dimension "d42" = 1.2
extrude "Extrusion10" add sketch "Sketch11" against normal blind 2.5 separate body contours A5 L5 A4 L4
sketch "Sketch12" plane through (38, 0, 0) normal (1, 0, 0) x (0, 0, -1)
  line L0 (55, 20) -> (-55, 20) projected
  arc A0 (-55, 20) -> (-55, -20) centre (-32.6393, 0) ccw projected
  arc A1 (55, -20) -> (55, 20) centre (32.6393, 0) ccw projected
  line L1 (-55, -20) -> (55, -20) projected
  point P0 (0, 0)
extrude "Extrusion11" add sketch "Sketch12" along normal blind 2.5 bodies 2
sketch "Sketch13" plane through (22, 0, 0) normal (1, 0, 0) x (0, 0, -1)
  line L0 (-48, 12.5) -> (-48, -12.5) projected
  line L1 (-48, 0) -> (-29.8, 0)
  line L2 (-29.8, 0) -> (-32.8, 0)
  line L3 (-29.8, 0) -> (-29.8, 8.1)
  line L4 (-29.8, 8.1) -> (-13.6, 8.1)
  line L5 (-13.6, 8.1) -> (-13.6, -8.1)
  line L6 (-13.6, -8.1) -> (-29.8, -8.1)
  line L7 (-29.8, -8.1) -> (-29.8, 0)
  line L8 (-32.8, 0) -> (-32.8, 5)
  line L9 (-32.8, 5) -> (-29.8, 5)
  line L10 (-32.8, 0) -> (-32.8, -5)
  line L11 (-32.8, -5) -> (-29.8, -5)
  line L12 (-21.7, 8.1) -> (-21.7, 11.1)
  line L13 (-21.7, 11.1) -> (-16.7, 11.1)
  line L14 (-16.7, 11.1) -> (-16.7, 7.9077)
  line L15 (-21.7, 11.1) -> (-26.7, 11.1)
  line L16 (-26.7, 11.1) -> (-26.7, 7.9077)
  line L17 (-26.7, 11.1) -> (-16.7, 11.1)
  line L18 (-16.7, 11.1) -> (-16.7, 8.1)
  line L19 (-16.7, 8.1) -> (-26.7, 8.1)
  line L20 (-26.7, 8.1) -> (-26.7, 11.1)
  line L21 (-32.8, 5) -> (-29.8, 5)
  line L22 (-29.8, 5) -> (-29.8, -5)
  line L23 (-29.8, -5) -> (-32.8, -5)
  line L24 (-32.8, -5) -> (-32.8, 5)
  point P0 (0, 0)
  dimension "d47" = 18.2
  dimension "d48" = 3
  dimension "d50" = 8.1
  dimension "d51" = 16.2
  dimension "d52" = 16.2
  dimension "d53" = 5
  dimension "d54" = 5
  dimension "d55" = 3
extrude "Extrusion12" cut sketch "Sketch13" along normal blind 50 bodies 2
sketch "Sketch14" plane through (40.5, 0, 0) normal (1, 0, 0) x (0, 0, -1)
  arc A0 (55, -20) -> (55, 20) centre (32.6393, 0) ccw projected
  line L0 (0, 0) -> (55, 20)
  line L1 (55, 20) -> (55, 0)
  line L2 (55, 0) -> (0, 0)
  circle A1 centre (32.6393, 0) radius 13.95
  dimension "d58" = 27.9
extrude "Extrusion13" cut sketch "Sketch14" against normal blind 50 contours A1 L0 | L0 A1 L2 | L2 A1 picked at (33.9931, 4.4486) bodies 2
sketch "Sketch15" plane through (40.5, 0, 0) normal (1, 0, 0) x (0, 0, -1)
  circle A0 centre (0, 0) radius 87.2959
extrude "Extrusion14" cut sketch "Sketch15" against normal blind 50 bodies 1
fillet "Fillet3" radius 2 12 edges at (39.25, 20, 55) (39.25, 20, -55) (39.25, -20, -55) (39.25, -20, 55) (36.75, 17.52, 53.8619) (36.75, -17.52, 53.8619) (36.75, 16.32, 53.2888) (36.75, -16.32, 53.2888) (36.75, -17.52, -53.8619) (36.75, 17.52, -53.8619) (36.75, 16.32, -53.2888) (36.75, -16.32, -53.2888)
fillet "Fillet4" radius 0.5 16 edges at (35.5, -17.3134, -53.7829) (35.5, -17.52, 0) (35.5, -17.3134, 53.7829) (35.5, 0, 60.1593) (35.5, 17.3134, 53.7829) (35.5, 17.52, 0) (35.5, 17.3134, -53.7829) (35.5, 0, -60.1593) (35.5, 16.1026, -53.2032) (35.5, 16.32, 0) (35.5, 16.1026, 53.2032) (35.5, 0, 58.9593) (35.5, -16.1026, 53.2032) (35.5, -16.32, 0) (35.5, -16.1026, -53.2032) (35.5, 0, -58.9593)
fillet "Fillet5" radius 0.5 11 edges at (38, 9.6, 26.7) (38, 8.1, 28.25) (38, 6.55, 29.8) (38, 5, 31.3) (38, 0, 32.8) (38, -5, 31.3) (38, -8.1, 21.7) (38, 0, 13.6) (38, 8.1, 15.15) (38, 9.6, 16.7) (38, 11.1, 21.7)
fillet "Fillet6" radius 0.5 1 edges at (38, 0, -18.6893)
properties part number "Controller top"
